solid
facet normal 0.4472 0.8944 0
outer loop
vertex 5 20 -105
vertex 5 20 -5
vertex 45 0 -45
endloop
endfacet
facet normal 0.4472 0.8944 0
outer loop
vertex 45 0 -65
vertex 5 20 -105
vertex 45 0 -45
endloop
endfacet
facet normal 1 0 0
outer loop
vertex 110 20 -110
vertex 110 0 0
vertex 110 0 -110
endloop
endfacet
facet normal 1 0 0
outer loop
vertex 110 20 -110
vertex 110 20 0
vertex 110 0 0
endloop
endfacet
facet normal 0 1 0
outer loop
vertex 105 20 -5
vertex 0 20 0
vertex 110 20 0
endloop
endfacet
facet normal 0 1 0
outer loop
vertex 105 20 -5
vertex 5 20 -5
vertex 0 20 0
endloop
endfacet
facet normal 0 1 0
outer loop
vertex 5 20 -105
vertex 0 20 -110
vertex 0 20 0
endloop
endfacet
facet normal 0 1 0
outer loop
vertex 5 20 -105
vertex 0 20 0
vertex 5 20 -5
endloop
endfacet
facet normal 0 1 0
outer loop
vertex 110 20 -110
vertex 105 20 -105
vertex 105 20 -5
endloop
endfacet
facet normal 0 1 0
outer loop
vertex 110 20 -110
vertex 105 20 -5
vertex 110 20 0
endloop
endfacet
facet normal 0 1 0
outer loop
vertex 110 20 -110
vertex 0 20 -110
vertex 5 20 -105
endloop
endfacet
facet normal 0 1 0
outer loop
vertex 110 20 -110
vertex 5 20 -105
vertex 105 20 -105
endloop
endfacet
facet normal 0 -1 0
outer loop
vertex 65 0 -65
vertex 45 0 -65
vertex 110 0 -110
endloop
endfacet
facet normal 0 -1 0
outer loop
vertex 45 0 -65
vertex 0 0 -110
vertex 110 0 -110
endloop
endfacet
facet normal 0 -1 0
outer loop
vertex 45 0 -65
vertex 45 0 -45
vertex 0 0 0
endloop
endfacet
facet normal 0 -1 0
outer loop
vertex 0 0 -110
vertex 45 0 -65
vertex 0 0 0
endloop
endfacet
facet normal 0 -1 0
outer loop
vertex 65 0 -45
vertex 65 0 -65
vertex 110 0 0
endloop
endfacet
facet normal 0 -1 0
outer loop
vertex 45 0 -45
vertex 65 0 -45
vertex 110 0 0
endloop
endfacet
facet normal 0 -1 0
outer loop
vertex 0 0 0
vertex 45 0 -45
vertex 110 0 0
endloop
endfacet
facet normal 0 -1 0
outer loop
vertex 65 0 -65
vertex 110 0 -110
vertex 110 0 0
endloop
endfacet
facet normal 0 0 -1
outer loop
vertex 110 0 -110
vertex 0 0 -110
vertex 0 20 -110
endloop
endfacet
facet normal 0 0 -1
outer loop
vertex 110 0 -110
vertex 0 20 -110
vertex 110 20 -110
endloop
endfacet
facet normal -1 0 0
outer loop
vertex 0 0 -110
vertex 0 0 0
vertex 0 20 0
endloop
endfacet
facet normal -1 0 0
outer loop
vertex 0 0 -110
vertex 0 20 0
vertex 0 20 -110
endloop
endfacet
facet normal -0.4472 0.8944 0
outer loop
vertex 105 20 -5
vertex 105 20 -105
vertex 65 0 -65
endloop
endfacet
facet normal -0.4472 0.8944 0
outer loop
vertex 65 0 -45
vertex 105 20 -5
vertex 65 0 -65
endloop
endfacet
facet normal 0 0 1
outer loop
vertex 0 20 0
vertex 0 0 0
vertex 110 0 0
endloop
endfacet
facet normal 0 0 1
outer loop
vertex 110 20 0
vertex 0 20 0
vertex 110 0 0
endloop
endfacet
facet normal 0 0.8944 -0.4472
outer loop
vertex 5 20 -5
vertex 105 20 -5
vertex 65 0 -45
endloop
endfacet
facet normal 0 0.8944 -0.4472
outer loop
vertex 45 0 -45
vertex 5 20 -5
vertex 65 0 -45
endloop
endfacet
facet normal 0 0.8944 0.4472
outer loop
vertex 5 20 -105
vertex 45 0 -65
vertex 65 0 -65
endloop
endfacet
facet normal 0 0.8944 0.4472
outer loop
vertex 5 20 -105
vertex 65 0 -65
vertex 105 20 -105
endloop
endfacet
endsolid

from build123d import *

# Parameters (mm, degrees)
CROQUIS1_W                          = 110
CROQUIS1_H                          = 110
CROQUIS1_W_2                        = 100
CROQUIS1_H_2                        = 100
SALIENTE_EXTRUIR1_DEPTH             = 20
SALIENTE_EXTRUIR2_DEPTH             = 100
SALIENTE_EXTRUIR3_REACH             = 126.599
SALIENTE_EXTRUIR3_DIRECTION_2_REACH = 126.599


with BuildPart() as part:
    # Croquis1 → Saliente-Extruir1 (new body)
    with BuildSketch(Plane(origin=(0, 0, 0), x_dir=(1, 0, 0), z_dir=(0, 1, 0))):
        with Locations((55, 55)):
            Rectangle(CROQUIS1_W, CROQUIS1_H)
        with Locations((55, 55)):
            Rectangle(CROQUIS1_W_2, CROQUIS1_H_2, mode=Mode.SUBTRACT)
    extrude(amount=SALIENTE_EXTRUIR1_DEPTH)

    # Croquis2 → Saliente-Extruir2 (add)
    with BuildSketch(Plane.XY.offset(-105)):
        Polygon((5, 20), (45, 0), (5, 0), align=None)
        Polygon((105, 0), (105, 20), (65, 0), align=None)
    extrude(amount=SALIENTE_EXTRUIR2_DEPTH)

    # Saliente-Extruir3: up to this face of the body (flat: up to its plane)
    saliente_extruir3_end = Plane(part.part.faces().sort_by_distance((110, 10, -55))[0])
    # Croquis3 → Saliente-Extruir3 (add, up to the picked face)
    with BuildSketch(Plane(origin=(55, 0, 0), x_dir=(0, 0, -1), z_dir=(1, 0, 0)), mode=Mode.PRIVATE) as saliente_extruir3_sk1:
        Polygon((5, 20), (45, 0), (5, 0), align=None)
    saliente_extruir3_tool1 = split(extrude(saliente_extruir3_sk1.sketch, amount=SALIENTE_EXTRUIR3_REACH, mode=Mode.PRIVATE), bisect_by=saliente_extruir3_end, keep=Keep.BOTH, mode=Mode.PRIVATE)
    # Croquis3 → Saliente-Extruir3 (add, up to the picked face)
    with BuildSketch(Plane(origin=(55, 0, 0), x_dir=(0, 0, -1), z_dir=(1, 0, 0)), mode=Mode.PRIVATE) as saliente_extruir3_sk2:
        Polygon((105, 0), (65, 0), (105, 20), align=None)
    saliente_extruir3_tool2 = split(extrude(saliente_extruir3_sk2.sketch, amount=SALIENTE_EXTRUIR3_REACH, mode=Mode.PRIVATE), bisect_by=saliente_extruir3_end, keep=Keep.BOTH, mode=Mode.PRIVATE)
    add(saliente_extruir3_tool1.solids().sort_by(Axis((55, 6.666667, -18.333333), (1, 0, 0)))[0])
    add(saliente_extruir3_tool2.solids().sort_by(Axis((55, 6.666667, -91.666667), (1, 0, 0)))[0])

    # Saliente-Extruir3 direction 2: up to this face of the body (flat: up to its plane)
    saliente_extruir3_direction_2_end = Plane(part.part.faces().sort_by_distance((0, 10, -55))[0])
    # Croquis3 → Saliente-Extruir3 direction 2 (add, up to the picked face)
    with BuildSketch(Plane(origin=(55, 0, 0), x_dir=(0, 0, -1), z_dir=(1, 0, 0)), mode=Mode.PRIVATE) as saliente_extruir3_direction_2_sk1:
        Polygon((5, 20), (45, 0), (5, 0), align=None)
    saliente_extruir3_direction_2_tool1 = split(extrude(saliente_extruir3_direction_2_sk1.sketch, amount=-SALIENTE_EXTRUIR3_DIRECTION_2_REACH, mode=Mode.PRIVATE), bisect_by=saliente_extruir3_direction_2_end, keep=Keep.BOTH, mode=Mode.PRIVATE)
    # Croquis3 → Saliente-Extruir3 direction 2 (add, up to the picked face)
    with BuildSketch(Plane(origin=(55, 0, 0), x_dir=(0, 0, -1), z_dir=(1, 0, 0)), mode=Mode.PRIVATE) as saliente_extruir3_direction_2_sk2:
        Polygon((105, 0), (65, 0), (105, 20), align=None)
    saliente_extruir3_direction_2_tool2 = split(extrude(saliente_extruir3_direction_2_sk2.sketch, amount=-SALIENTE_EXTRUIR3_DIRECTION_2_REACH, mode=Mode.PRIVATE), bisect_by=saliente_extruir3_direction_2_end, keep=Keep.BOTH, mode=Mode.PRIVATE)
    add(saliente_extruir3_direction_2_tool1.solids().sort_by(Axis((55, 6.666667, -18.333333), (-1, 0, 0)))[0])
    add(saliente_extruir3_direction_2_tool2.solids().sort_by(Axis((55, 6.666667, -91.666667), (-1, 0, 0)))[0])


solid = part.part
